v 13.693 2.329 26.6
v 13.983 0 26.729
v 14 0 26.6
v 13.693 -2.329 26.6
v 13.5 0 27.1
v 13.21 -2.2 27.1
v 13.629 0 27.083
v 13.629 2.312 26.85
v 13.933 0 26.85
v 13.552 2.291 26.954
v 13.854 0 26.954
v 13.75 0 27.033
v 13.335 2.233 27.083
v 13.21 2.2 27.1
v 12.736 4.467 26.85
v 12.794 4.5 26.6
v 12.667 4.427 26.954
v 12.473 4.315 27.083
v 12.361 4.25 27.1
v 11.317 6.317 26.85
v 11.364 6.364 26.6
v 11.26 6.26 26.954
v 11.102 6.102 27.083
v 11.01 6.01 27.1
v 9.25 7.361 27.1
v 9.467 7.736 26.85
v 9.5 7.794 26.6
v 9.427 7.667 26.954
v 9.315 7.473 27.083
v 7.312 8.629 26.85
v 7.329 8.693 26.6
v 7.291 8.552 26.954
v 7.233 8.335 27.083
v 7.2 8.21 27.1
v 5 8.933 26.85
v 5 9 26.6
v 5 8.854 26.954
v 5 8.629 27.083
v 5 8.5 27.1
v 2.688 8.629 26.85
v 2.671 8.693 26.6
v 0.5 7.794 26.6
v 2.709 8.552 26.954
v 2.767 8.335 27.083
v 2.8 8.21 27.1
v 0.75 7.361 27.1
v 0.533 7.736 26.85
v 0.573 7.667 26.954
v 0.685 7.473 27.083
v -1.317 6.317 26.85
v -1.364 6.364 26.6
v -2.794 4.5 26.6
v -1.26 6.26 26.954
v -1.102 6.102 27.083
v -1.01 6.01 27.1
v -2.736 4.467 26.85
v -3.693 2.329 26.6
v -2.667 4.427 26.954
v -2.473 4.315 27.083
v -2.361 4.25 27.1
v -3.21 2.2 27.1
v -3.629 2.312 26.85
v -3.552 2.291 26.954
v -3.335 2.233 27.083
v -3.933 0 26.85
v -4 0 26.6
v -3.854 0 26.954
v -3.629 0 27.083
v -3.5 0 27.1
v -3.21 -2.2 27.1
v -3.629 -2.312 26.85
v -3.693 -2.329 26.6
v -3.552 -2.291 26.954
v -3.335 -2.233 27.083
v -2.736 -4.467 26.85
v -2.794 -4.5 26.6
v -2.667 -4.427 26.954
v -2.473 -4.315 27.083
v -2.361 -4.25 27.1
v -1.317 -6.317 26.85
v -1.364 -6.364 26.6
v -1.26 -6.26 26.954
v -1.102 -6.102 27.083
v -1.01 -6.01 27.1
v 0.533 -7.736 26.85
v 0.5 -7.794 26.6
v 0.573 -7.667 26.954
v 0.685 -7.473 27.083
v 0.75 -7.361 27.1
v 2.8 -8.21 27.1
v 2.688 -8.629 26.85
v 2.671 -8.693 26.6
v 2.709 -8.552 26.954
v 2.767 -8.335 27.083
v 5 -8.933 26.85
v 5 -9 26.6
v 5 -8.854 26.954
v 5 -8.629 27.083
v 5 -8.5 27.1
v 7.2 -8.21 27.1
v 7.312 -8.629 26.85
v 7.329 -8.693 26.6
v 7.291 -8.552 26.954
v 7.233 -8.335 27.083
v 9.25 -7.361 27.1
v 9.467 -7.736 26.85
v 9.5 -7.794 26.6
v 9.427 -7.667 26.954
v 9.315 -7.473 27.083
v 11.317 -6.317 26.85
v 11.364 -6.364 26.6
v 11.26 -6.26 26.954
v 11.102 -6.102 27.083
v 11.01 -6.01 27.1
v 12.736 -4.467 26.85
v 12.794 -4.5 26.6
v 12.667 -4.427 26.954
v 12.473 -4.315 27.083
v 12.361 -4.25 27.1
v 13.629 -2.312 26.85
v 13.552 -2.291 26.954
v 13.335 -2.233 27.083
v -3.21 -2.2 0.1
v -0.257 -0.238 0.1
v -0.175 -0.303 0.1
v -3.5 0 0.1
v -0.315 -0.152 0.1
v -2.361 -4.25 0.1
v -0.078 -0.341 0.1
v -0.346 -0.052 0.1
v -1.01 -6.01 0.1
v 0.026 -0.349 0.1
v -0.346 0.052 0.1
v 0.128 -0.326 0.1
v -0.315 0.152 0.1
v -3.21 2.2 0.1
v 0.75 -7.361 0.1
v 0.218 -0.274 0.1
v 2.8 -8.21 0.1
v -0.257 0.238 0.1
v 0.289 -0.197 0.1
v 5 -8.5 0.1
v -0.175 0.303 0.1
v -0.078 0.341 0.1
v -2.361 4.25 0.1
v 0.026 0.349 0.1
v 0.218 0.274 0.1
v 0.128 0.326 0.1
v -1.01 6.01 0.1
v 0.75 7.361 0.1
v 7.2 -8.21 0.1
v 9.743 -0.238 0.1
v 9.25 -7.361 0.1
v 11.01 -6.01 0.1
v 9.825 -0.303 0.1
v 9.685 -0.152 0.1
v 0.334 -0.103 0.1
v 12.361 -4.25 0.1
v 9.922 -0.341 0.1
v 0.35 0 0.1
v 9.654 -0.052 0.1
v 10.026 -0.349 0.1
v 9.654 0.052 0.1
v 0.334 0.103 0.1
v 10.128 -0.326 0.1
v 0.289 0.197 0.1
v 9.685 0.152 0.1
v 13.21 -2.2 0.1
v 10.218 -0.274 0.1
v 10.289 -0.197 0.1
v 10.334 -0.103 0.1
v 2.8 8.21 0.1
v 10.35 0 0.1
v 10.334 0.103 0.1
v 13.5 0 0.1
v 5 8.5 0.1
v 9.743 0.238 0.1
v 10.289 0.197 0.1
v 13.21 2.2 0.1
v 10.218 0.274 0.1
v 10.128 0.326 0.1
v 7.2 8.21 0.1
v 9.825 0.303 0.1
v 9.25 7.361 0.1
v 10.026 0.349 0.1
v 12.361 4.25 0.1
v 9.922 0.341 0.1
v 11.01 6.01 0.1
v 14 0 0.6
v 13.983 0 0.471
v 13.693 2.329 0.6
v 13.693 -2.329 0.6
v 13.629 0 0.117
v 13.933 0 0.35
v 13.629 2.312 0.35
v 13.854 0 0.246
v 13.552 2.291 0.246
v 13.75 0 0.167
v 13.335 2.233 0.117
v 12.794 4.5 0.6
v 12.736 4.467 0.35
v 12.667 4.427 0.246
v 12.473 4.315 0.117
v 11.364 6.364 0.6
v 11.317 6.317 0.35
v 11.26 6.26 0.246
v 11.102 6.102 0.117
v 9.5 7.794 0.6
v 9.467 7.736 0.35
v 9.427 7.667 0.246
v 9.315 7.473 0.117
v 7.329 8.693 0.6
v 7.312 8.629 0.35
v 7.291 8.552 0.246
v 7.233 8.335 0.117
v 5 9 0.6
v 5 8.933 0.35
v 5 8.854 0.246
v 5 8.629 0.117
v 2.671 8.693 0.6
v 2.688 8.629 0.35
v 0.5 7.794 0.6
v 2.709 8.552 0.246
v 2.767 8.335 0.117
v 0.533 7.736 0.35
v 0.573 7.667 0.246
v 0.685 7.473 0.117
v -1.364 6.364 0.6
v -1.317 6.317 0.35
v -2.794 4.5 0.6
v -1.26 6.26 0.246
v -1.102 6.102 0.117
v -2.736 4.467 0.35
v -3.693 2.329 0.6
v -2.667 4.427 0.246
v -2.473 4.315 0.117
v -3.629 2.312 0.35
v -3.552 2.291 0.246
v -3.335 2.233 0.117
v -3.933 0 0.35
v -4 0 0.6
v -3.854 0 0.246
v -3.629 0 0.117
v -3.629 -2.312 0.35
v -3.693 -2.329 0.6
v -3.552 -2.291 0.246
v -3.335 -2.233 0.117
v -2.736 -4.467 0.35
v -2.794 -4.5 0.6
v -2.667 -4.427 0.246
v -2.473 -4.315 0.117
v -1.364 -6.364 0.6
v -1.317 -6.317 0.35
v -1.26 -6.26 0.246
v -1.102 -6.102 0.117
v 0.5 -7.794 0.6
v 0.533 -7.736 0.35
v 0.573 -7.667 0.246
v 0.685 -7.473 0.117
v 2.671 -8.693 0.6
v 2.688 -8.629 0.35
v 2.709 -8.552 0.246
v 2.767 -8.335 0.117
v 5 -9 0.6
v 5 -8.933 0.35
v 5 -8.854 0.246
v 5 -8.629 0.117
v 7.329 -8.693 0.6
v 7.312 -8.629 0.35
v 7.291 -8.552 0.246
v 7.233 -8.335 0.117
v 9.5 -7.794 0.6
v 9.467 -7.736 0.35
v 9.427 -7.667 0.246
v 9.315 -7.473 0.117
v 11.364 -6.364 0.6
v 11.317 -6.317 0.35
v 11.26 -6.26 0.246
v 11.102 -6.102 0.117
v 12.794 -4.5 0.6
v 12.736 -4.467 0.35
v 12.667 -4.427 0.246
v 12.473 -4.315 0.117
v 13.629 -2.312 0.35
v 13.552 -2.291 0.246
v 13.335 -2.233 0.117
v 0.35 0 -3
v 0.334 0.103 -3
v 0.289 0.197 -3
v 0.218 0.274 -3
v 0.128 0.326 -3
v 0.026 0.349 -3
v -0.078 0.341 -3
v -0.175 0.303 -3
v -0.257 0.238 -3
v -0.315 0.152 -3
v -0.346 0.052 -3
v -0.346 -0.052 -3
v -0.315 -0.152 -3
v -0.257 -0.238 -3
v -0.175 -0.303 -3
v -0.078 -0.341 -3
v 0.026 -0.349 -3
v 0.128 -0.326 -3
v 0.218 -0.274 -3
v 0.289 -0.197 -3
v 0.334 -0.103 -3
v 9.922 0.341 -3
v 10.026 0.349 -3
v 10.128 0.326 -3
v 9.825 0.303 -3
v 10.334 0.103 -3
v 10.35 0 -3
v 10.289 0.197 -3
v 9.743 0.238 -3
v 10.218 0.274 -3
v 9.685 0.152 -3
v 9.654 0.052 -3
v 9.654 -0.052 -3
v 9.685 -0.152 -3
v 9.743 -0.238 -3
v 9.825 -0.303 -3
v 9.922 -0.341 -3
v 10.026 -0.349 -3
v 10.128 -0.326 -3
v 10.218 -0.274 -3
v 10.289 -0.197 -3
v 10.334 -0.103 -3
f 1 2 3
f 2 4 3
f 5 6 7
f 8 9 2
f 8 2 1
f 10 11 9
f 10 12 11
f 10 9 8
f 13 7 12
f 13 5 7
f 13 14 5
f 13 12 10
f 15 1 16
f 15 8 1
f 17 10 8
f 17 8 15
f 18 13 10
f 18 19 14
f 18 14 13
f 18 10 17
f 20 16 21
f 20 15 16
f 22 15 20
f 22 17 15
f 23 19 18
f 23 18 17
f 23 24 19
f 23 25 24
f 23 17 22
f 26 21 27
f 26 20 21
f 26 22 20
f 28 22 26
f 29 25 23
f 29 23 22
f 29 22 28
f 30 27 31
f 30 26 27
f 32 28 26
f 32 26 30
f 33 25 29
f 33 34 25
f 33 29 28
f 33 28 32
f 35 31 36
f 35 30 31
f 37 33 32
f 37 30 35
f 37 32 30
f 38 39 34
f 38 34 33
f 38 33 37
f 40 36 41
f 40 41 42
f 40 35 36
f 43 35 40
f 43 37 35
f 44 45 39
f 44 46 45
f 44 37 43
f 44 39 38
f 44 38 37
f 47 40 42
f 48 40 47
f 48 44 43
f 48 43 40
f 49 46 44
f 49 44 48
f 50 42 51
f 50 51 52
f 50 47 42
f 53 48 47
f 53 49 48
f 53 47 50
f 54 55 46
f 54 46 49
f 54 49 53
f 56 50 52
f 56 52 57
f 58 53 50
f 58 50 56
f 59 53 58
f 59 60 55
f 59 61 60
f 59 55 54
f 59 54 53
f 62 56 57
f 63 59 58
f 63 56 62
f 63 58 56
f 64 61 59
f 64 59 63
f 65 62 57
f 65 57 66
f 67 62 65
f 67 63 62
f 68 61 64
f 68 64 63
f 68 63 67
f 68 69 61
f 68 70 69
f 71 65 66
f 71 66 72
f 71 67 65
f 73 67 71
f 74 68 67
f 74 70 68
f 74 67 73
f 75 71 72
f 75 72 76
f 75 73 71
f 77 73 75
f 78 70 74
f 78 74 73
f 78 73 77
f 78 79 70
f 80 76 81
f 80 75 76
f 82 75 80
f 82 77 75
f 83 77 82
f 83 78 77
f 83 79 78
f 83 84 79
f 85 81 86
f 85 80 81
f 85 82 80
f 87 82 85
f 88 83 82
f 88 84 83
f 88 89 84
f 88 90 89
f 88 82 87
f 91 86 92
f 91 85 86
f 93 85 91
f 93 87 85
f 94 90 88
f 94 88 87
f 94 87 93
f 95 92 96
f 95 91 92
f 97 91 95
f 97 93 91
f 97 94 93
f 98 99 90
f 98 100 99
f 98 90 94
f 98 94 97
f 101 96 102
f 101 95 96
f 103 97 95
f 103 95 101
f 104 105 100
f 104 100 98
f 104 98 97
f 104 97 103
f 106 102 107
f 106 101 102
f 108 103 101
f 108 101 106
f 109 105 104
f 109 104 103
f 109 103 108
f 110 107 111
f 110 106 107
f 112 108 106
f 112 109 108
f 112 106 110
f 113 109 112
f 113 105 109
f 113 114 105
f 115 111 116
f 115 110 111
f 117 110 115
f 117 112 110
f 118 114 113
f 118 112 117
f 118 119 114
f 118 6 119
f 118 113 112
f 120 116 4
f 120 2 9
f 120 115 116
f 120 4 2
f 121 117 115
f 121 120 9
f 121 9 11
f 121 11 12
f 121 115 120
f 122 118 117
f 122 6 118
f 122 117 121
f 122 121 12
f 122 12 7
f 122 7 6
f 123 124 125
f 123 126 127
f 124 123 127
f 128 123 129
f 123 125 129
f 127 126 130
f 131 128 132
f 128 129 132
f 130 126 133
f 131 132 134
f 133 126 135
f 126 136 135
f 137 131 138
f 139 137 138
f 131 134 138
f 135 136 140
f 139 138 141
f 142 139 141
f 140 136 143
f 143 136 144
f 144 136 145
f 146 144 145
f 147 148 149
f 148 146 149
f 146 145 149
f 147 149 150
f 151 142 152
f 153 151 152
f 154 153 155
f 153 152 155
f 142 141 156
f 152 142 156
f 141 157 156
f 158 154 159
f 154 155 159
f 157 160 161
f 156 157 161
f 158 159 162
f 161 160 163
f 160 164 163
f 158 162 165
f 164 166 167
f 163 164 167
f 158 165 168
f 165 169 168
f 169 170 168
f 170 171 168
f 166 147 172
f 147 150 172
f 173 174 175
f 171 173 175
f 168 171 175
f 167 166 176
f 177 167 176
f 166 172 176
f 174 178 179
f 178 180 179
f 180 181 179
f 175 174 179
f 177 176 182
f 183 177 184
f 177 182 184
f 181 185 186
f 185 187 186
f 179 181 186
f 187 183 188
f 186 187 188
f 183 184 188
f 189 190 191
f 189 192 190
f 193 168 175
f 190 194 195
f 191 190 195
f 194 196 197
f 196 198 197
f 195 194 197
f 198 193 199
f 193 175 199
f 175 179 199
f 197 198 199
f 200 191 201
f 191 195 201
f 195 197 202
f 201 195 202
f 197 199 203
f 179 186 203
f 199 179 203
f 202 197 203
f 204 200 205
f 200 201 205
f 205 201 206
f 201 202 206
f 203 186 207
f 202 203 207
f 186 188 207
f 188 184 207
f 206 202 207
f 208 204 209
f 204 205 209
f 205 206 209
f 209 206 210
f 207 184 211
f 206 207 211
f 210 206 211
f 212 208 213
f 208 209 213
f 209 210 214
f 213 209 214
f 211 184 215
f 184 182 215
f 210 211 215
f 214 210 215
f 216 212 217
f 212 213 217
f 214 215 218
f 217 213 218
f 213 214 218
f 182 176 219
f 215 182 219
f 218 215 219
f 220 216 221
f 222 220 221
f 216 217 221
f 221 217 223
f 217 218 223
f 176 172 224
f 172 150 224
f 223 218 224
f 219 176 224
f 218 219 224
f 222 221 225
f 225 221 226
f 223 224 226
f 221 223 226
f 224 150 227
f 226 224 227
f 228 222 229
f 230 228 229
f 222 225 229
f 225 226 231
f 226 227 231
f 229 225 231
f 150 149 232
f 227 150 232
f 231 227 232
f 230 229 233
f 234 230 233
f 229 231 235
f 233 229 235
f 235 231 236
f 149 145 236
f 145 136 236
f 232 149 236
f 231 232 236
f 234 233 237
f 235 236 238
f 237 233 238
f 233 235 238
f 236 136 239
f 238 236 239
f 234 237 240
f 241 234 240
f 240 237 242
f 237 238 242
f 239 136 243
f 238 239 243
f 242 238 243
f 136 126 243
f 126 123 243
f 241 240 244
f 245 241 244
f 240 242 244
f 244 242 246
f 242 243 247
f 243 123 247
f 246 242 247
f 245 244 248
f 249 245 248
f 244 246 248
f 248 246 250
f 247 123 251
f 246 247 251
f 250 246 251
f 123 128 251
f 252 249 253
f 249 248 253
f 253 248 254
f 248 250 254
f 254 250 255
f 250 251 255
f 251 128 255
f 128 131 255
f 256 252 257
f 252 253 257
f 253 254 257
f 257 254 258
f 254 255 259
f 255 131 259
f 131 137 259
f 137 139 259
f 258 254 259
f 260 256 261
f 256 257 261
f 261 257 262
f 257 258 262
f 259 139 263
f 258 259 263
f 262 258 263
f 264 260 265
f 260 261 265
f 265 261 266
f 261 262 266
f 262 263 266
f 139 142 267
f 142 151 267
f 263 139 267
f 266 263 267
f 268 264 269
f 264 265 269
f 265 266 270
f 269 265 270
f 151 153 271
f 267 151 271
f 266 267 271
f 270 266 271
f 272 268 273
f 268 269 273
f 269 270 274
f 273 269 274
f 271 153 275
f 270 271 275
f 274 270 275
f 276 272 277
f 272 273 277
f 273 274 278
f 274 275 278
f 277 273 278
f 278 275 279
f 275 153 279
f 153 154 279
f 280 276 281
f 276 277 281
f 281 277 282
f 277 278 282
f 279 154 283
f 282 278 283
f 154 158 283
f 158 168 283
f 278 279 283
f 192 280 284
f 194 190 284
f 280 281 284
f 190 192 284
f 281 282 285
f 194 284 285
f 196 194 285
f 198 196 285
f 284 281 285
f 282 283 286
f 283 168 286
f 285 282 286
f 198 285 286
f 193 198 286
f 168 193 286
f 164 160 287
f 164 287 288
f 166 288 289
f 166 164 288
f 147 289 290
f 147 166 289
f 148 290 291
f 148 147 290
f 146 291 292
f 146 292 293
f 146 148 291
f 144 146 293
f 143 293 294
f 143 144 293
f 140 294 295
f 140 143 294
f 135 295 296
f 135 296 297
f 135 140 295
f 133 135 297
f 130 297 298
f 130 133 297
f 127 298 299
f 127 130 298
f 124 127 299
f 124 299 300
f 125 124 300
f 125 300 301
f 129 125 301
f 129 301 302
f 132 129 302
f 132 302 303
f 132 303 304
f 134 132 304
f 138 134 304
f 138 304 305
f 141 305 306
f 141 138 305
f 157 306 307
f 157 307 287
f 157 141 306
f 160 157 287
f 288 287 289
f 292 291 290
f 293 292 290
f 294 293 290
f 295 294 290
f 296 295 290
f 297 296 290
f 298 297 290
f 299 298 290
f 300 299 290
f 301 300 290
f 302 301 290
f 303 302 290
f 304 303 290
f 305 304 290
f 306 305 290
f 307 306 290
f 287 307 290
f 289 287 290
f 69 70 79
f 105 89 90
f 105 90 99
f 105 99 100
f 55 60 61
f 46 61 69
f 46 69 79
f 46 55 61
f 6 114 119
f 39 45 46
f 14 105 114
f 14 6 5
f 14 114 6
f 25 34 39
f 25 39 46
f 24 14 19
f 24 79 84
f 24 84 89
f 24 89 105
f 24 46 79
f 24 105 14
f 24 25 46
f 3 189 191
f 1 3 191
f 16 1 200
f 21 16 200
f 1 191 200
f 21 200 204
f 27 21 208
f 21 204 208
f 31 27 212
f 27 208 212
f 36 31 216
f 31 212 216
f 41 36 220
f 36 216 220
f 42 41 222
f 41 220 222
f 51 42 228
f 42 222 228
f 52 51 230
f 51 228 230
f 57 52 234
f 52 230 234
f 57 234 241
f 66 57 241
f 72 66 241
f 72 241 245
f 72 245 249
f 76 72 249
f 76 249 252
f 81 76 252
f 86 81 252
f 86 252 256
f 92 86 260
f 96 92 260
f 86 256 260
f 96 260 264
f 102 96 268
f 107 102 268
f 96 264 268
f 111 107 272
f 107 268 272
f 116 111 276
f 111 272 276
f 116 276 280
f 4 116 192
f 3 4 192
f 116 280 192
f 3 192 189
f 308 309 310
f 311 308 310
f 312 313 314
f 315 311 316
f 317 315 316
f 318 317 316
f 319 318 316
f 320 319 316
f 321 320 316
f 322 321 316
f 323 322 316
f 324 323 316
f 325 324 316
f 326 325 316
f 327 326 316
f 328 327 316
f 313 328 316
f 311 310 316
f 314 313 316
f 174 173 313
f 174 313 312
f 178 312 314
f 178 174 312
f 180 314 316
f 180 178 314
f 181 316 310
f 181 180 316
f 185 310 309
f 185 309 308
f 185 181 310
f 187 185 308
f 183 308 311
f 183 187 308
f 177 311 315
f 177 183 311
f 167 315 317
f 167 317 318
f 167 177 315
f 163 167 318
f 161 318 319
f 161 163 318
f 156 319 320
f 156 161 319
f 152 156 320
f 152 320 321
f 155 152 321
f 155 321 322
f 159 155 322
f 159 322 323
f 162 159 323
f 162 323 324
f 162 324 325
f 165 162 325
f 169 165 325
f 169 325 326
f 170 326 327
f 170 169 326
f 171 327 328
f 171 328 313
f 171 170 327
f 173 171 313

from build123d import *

# Parameters (mm, degrees)
SKETCH001_R       = 0.35
PAD001_DEPTH      = 13.5
PAD001_DEPTH_BACK = 3.5
SKETCH_R          = 9
PAD_DEPTH         = 27
FILLET_R          = 0.5


with BuildPart() as pad001:
    # Sketch001 → Pad001 (new body, two sides)
    with BuildSketch(Plane.XY.offset(0.5)) as pad001_sk:
        Circle(SKETCH001_R)
        with Locations((10, 0)):
            Circle(SKETCH001_R)
    extrude(amount=PAD001_DEPTH)
    extrude(pad001_sk.sketch, amount=-PAD001_DEPTH_BACK)


with BuildPart() as l_radial_d18_0mm_p10_00mm:
    # Sketch → Pad (new body)
    with BuildSketch(Plane.XY.offset(0.1)):
        with Locations((5, 0)):
            Circle(SKETCH_R)
    extrude(amount=PAD_DEPTH)

    # Fillet
    fillet_edges = [l_radial_d18_0mm_p10_00mm.edges().sort_by_distance(p)[0] for p in [
        (-4, 0, 0.1),
        (-4, 0, 27.1),
    ]]
    fillet(fillet_edges, radius=FILLET_R)

    # Fillet_mp_cp: union Pad001
    add(pad001.part)


solid = l_radial_d18_0mm_p10_00mm.part
